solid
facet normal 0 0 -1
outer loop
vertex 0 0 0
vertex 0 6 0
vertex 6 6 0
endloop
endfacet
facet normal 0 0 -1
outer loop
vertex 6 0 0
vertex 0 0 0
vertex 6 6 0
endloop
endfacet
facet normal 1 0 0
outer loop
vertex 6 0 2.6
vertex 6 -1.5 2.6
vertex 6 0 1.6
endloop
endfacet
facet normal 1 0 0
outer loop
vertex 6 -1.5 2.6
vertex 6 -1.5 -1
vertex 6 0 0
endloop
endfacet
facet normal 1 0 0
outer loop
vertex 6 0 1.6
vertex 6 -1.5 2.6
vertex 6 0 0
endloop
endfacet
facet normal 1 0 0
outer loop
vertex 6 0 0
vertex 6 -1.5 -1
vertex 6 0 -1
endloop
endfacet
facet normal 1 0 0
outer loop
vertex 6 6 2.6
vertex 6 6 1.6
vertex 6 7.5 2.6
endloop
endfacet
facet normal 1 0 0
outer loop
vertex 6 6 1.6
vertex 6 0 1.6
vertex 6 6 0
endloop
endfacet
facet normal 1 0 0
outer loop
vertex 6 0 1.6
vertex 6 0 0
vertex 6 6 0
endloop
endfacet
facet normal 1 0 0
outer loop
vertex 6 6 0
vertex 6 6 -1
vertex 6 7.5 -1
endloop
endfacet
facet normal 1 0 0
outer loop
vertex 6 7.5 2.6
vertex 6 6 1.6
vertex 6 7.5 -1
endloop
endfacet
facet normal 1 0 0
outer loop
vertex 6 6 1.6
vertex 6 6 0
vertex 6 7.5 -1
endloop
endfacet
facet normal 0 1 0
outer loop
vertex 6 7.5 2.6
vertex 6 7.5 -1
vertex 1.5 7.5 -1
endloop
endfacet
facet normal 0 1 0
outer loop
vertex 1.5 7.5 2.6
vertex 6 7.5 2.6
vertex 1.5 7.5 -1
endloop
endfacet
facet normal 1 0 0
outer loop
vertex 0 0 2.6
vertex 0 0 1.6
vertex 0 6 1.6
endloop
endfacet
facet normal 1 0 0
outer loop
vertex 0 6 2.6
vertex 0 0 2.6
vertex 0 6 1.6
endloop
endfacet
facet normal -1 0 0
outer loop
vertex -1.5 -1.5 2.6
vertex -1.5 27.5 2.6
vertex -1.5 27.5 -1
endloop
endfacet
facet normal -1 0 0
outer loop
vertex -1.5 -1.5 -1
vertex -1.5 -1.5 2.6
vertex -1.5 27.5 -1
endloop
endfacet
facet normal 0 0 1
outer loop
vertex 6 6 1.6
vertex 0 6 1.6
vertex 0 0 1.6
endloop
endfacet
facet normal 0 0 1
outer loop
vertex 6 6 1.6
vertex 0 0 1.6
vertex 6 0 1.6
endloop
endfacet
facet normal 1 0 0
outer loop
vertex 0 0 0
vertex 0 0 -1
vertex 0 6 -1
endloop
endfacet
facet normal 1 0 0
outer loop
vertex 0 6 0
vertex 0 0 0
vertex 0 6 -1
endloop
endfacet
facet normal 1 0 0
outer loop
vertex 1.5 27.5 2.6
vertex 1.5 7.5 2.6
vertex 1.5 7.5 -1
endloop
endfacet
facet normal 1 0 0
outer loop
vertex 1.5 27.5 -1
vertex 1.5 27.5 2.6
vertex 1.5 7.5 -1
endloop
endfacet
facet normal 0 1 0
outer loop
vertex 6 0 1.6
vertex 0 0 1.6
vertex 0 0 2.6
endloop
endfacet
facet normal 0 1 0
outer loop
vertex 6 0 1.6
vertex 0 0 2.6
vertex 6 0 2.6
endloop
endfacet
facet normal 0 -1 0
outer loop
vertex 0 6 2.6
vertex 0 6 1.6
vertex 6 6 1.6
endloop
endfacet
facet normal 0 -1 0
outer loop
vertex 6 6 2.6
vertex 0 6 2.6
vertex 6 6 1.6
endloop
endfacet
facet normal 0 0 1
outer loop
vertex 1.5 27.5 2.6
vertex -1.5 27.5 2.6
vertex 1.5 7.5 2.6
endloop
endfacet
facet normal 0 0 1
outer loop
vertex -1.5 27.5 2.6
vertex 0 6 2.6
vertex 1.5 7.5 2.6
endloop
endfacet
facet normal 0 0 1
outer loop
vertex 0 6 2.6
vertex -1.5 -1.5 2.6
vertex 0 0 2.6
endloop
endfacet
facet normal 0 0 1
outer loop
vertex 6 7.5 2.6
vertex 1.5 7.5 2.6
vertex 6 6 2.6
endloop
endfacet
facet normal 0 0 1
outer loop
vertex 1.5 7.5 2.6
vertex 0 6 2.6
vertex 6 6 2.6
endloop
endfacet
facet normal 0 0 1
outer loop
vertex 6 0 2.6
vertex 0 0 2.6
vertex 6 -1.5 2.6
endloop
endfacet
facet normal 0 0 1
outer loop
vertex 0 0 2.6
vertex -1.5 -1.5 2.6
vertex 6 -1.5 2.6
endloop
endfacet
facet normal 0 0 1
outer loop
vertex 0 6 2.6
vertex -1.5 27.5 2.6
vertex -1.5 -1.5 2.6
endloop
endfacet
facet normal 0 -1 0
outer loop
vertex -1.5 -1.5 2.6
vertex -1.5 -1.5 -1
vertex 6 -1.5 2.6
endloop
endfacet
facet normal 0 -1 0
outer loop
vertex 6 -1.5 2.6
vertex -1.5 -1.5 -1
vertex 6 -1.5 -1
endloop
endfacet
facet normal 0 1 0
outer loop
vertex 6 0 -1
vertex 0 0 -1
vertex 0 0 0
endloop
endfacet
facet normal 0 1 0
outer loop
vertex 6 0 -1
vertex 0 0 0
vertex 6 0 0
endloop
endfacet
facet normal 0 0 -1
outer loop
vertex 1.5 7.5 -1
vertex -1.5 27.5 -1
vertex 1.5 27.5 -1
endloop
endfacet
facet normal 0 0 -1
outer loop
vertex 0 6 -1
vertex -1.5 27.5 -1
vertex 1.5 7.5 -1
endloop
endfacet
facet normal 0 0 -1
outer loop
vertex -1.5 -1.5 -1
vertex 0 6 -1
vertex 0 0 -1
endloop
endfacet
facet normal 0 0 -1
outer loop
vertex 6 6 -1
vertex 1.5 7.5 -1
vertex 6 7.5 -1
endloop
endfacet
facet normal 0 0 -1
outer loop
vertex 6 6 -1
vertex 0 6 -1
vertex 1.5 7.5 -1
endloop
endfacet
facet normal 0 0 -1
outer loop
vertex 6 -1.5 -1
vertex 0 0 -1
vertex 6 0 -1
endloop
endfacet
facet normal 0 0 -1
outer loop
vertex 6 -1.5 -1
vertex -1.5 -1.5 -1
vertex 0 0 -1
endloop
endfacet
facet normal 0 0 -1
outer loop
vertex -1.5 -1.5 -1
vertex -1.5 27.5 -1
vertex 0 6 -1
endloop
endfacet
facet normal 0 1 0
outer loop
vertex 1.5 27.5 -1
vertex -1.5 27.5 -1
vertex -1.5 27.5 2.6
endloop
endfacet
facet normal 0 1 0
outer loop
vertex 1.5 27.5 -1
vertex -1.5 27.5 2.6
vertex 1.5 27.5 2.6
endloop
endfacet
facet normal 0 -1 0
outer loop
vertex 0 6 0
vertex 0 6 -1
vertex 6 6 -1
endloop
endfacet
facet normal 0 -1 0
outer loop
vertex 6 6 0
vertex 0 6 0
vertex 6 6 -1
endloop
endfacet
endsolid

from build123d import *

# Parameters (mm, degrees)
ESQUISSE1_W             = 6
ESQUISSE1_H             = 6
BOSS_EXTRU_3_DEPTH      = 1.6
BOSS_EXTRU_4_DEPTH      = 1
BOSS_EXTRU_4_DEPTH_BACK = 2.6
ESQUISSE3_W             = 6
ESQUISSE3_H             = 1.5
ESQUISSE6_W             = 3
ESQUISSE6_H             = 3.6
BOSS_EXTRU_7_DEPTH      = 20


with BuildPart() as part:
    # Esquisse1 → Boss.-Extru.3 (new body)
    with BuildSketch(Plane.XY):
        with Locations((3, 3)):
            Rectangle(ESQUISSE1_W, ESQUISSE1_H)
    extrude(amount=BOSS_EXTRU_3_DEPTH)

    # Esquisse3 → Boss.-Extru.4 (add, two sides: drawn at the far end of the back side and taken through both)
    with BuildSketch(Plane.XY.offset(1.6).offset(-BOSS_EXTRU_4_DEPTH_BACK)):
        with Locations((3, 6.75)):
            Rectangle(ESQUISSE3_W, ESQUISSE3_H)
        Polygon((0, 7.5), (-1.5, 7.5), (-1.5, -1.5), (0, -1.5), (0, 0), (0, 6), align=None)
        with Locations((3, -0.75)):
            Rectangle(ESQUISSE3_W, ESQUISSE3_H)
    extrude(amount=BOSS_EXTRU_4_DEPTH + BOSS_EXTRU_4_DEPTH_BACK)

    # Esquisse6 → Boss.-Extru.7 (add)
    with BuildSketch(Plane(origin=(0, 7.5, 0), x_dir=(1, 0, 0), z_dir=(0, 1, 0))):
        with Locations((0, -0.8)):
            Rectangle(ESQUISSE6_W, ESQUISSE6_H)
    extrude(amount=BOSS_EXTRU_7_DEPTH)


solid = part.part
